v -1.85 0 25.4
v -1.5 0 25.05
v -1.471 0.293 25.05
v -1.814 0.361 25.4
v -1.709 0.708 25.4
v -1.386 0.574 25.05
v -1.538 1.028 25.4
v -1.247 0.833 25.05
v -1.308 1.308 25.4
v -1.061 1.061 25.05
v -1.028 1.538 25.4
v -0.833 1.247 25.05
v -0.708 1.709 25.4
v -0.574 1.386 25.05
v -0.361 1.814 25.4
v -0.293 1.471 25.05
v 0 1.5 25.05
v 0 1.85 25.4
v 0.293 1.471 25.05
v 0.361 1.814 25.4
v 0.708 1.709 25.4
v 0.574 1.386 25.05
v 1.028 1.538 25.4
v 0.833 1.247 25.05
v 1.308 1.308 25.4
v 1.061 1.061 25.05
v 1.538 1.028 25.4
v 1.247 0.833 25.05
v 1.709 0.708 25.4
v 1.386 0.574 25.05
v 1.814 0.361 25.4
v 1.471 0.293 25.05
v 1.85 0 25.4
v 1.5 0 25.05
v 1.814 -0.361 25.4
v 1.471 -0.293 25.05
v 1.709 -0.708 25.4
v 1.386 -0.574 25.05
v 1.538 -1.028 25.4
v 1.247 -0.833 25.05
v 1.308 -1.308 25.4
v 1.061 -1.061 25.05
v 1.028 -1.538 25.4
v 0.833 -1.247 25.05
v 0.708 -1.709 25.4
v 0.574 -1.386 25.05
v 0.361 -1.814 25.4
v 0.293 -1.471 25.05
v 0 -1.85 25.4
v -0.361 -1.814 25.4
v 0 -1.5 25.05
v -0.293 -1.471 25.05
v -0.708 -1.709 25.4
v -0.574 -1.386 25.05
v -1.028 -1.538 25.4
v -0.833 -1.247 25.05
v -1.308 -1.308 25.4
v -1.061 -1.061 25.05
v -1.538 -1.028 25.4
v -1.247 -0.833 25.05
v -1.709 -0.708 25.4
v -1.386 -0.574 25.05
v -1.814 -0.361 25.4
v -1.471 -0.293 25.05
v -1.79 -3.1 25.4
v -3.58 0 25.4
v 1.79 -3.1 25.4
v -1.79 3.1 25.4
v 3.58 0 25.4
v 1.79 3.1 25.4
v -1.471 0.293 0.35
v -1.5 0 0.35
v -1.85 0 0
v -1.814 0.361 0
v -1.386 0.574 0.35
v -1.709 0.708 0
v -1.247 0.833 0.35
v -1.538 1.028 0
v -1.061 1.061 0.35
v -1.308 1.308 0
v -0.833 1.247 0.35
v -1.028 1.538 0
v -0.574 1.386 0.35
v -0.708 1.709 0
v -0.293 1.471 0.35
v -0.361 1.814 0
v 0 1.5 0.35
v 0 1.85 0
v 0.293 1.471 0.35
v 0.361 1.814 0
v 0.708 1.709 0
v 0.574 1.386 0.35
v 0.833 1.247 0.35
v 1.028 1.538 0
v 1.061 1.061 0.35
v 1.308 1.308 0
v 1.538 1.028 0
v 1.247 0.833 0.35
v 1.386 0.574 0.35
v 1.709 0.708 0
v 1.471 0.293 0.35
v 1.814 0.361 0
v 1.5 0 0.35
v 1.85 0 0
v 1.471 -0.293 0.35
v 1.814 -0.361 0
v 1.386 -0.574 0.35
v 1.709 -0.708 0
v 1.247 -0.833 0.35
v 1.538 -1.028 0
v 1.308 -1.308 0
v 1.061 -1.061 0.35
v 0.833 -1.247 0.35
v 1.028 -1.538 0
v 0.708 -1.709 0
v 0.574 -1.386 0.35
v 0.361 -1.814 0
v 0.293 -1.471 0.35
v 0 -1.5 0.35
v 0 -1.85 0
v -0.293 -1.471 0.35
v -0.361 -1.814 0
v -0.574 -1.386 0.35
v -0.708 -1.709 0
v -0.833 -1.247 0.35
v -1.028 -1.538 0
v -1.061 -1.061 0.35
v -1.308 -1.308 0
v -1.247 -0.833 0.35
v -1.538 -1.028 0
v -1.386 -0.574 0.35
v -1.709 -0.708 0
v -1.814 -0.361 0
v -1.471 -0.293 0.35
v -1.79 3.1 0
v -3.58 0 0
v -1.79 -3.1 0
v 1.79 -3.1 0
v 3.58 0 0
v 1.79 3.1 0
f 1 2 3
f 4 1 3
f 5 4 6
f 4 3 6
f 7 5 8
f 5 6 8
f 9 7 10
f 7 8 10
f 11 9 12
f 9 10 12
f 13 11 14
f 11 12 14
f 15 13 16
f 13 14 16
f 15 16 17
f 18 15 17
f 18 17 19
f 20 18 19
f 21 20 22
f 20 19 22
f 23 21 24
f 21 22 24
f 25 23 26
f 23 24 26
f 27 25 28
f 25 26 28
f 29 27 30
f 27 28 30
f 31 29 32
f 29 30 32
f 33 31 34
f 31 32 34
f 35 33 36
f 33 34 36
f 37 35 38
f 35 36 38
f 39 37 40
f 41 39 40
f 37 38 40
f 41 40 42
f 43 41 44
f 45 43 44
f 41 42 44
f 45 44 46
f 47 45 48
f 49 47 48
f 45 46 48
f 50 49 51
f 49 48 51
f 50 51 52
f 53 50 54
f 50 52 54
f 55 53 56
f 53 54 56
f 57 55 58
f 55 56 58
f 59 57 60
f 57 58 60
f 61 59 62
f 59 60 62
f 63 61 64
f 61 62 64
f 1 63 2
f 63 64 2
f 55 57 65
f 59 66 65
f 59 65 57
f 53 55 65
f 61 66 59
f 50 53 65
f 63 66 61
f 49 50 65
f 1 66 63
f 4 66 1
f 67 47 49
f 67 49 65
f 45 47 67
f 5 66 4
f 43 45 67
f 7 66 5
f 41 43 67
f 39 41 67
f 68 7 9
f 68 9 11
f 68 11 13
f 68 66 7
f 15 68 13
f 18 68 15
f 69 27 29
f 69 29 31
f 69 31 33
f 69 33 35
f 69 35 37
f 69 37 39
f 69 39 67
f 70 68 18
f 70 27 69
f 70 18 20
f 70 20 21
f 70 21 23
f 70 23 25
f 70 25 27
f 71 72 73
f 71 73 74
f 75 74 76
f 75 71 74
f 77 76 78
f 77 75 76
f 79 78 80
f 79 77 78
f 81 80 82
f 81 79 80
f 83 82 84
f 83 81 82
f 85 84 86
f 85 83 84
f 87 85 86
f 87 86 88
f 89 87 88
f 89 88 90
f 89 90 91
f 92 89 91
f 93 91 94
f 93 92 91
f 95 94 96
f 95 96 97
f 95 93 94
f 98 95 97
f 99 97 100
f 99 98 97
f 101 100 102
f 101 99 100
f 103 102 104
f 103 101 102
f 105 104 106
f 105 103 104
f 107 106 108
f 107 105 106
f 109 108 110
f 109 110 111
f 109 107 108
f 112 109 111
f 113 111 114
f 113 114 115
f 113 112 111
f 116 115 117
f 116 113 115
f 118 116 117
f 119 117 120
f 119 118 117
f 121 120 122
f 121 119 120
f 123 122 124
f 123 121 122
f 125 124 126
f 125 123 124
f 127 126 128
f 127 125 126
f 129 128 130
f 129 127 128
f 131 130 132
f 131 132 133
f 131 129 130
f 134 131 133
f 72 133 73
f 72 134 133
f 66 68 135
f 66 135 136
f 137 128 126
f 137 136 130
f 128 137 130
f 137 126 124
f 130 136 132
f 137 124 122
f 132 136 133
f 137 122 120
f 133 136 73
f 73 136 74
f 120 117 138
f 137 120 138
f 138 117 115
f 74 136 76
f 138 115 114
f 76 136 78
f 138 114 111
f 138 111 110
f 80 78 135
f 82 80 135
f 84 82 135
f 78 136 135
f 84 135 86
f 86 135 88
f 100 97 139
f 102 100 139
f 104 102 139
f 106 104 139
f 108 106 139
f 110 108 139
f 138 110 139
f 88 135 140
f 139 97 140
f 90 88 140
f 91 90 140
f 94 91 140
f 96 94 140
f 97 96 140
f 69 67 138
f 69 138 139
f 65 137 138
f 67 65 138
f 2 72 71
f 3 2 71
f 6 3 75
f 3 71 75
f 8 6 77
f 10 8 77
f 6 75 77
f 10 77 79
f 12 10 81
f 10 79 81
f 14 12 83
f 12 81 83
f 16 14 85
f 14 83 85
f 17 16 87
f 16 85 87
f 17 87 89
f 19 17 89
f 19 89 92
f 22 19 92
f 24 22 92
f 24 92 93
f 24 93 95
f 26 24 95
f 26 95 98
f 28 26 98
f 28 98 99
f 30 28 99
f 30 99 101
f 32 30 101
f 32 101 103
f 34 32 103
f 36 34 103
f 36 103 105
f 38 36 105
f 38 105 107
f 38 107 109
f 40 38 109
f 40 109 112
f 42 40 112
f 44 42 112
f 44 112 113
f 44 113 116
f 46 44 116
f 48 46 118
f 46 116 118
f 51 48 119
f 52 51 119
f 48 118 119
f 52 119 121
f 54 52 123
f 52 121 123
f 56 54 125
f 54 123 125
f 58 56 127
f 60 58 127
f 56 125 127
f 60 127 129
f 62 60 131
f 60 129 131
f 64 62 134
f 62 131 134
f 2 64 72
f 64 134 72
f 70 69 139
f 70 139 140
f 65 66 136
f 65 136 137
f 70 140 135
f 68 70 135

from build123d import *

# Parameters (mm, degrees)
BOSS_EXTRUDE1_DEPTH          = 25.4
F_3_0_3_DIAMETER_HOLE1_D     = 3
F_3_0_3_DIAMETER_HOLE1_DEPTH = 25.4
CHAMFER1_SIZE                = 0.35


with BuildPart() as part:
    # Sketch1 → Boss-Extrude1 (new body)
    with BuildSketch(Plane.XY.offset(25.4)):
        Polygon((-3.579571669, 0), (-1.789785834, -3.1), (1.789785834, -3.1), (3.579571669, 0), (1.789785834, 3.1), (-1.789785834, 3.1), align=None)
    extrude(amount=-BOSS_EXTRUDE1_DEPTH)

    # Ø3.0 (3) Diameter Hole1
    with Locations(Plane.XY.offset(25.4)):
        with Locations((0, 0)):
            Hole(F_3_0_3_DIAMETER_HOLE1_D / 2, depth=F_3_0_3_DIAMETER_HOLE1_DEPTH)

    # Chamfer1
    chamfer1_edges = [part.edges().sort_by_distance(p)[0] for p in [
        (1.5, 0, 25.4),
        (1.5, 0, 0),
    ]]
    chamfer(chamfer1_edges, length=CHAMFER1_SIZE)


solid = part.part
